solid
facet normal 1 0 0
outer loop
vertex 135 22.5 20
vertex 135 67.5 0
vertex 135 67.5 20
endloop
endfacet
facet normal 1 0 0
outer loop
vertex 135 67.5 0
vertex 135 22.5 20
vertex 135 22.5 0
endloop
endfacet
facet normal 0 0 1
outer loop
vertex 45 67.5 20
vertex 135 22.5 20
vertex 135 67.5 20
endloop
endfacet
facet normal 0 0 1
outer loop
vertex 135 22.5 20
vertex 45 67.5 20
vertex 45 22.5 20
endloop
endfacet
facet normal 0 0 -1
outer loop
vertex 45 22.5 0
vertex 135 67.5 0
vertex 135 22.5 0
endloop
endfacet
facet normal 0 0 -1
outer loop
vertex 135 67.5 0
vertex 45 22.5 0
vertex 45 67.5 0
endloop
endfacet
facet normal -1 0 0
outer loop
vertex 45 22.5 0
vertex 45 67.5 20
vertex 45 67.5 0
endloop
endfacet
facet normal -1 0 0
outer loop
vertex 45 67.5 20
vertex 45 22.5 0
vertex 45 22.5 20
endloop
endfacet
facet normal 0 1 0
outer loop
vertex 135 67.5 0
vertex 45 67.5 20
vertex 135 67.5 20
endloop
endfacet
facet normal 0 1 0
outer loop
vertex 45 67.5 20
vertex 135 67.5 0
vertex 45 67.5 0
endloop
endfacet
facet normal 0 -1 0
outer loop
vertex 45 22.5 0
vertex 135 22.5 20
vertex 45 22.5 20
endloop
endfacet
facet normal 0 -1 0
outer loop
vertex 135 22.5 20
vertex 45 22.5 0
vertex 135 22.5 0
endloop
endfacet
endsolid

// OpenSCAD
// Drying rack for 10 microscope slides
// Base block: 90 x 45 x 20 mm
// 10 slots: 77 mm long (X), 1.6 mm wide (Y), 10 mm deep, 3.5 mm pitch

// Base block dimensions
BLOCK_X = 90;
BLOCK_Y = 45;
BLOCK_Z = 20;

// Slot dimensions
SLOT_LENGTH = 77;
SLOT_WIDTH = 1.6;
SLOT_DEPTH = 10;

// Slot spacing
SLOT_PITCH = 3.5;
NUM_SLOTS = 10;

// Calculate slot group width and offset
SLOT_GROUP_WIDTH = (NUM_SLOTS - 1) * SLOT_PITCH;
SLOT_Y_OFFSET = SLOT_GROUP_WIDTH / 2;

// Slot X offset to centre the 77 mm slot in the 90 mm block
SLOT_X_OFFSET = (BLOCK_X - SLOT_LENGTH) / 2;

// Slot Y positions (centred on block)
SLOT_Y_START = -SLOT_Y_OFFSET;

// Cutting shape extension to avoid coplanar faces
EXTEND = 0.5;

module base_block() {
    // Centre the block on the origin in X and Y
    translate([BLOCK_X / 2, BLOCK_Y / 2, 0]) {
        cube([BLOCK_X, BLOCK_Y, BLOCK_Z], center = false);
    }
}

module slot_cut(slot_y_pos) {
    // Slot extends slightly past the top face (z=20) and bottom of cut (z=10)
    // Slot is centred in X, positioned at specific Y
    translate([
        SLOT_X_OFFSET - EXTEND,
        slot_y_pos - SLOT_WIDTH / 2 - EXTEND,
        -EXTEND
    ]) {
        cube([
            SLOT_LENGTH + 2 * EXTEND,
            SLOT_WIDTH + 2 * EXTEND,
            SLOT_DEPTH + BLOCK_Z + 2 * EXTEND
        ], center = false);
    }
}

// Build the rack: base block with slots cut out
difference() {
    base_block();
    
    for (i = [0 : NUM_SLOTS - 1]) {
        slot_y = SLOT_Y_START + i * SLOT_PITCH;
        slot_cut(slot_y);
    }
}
